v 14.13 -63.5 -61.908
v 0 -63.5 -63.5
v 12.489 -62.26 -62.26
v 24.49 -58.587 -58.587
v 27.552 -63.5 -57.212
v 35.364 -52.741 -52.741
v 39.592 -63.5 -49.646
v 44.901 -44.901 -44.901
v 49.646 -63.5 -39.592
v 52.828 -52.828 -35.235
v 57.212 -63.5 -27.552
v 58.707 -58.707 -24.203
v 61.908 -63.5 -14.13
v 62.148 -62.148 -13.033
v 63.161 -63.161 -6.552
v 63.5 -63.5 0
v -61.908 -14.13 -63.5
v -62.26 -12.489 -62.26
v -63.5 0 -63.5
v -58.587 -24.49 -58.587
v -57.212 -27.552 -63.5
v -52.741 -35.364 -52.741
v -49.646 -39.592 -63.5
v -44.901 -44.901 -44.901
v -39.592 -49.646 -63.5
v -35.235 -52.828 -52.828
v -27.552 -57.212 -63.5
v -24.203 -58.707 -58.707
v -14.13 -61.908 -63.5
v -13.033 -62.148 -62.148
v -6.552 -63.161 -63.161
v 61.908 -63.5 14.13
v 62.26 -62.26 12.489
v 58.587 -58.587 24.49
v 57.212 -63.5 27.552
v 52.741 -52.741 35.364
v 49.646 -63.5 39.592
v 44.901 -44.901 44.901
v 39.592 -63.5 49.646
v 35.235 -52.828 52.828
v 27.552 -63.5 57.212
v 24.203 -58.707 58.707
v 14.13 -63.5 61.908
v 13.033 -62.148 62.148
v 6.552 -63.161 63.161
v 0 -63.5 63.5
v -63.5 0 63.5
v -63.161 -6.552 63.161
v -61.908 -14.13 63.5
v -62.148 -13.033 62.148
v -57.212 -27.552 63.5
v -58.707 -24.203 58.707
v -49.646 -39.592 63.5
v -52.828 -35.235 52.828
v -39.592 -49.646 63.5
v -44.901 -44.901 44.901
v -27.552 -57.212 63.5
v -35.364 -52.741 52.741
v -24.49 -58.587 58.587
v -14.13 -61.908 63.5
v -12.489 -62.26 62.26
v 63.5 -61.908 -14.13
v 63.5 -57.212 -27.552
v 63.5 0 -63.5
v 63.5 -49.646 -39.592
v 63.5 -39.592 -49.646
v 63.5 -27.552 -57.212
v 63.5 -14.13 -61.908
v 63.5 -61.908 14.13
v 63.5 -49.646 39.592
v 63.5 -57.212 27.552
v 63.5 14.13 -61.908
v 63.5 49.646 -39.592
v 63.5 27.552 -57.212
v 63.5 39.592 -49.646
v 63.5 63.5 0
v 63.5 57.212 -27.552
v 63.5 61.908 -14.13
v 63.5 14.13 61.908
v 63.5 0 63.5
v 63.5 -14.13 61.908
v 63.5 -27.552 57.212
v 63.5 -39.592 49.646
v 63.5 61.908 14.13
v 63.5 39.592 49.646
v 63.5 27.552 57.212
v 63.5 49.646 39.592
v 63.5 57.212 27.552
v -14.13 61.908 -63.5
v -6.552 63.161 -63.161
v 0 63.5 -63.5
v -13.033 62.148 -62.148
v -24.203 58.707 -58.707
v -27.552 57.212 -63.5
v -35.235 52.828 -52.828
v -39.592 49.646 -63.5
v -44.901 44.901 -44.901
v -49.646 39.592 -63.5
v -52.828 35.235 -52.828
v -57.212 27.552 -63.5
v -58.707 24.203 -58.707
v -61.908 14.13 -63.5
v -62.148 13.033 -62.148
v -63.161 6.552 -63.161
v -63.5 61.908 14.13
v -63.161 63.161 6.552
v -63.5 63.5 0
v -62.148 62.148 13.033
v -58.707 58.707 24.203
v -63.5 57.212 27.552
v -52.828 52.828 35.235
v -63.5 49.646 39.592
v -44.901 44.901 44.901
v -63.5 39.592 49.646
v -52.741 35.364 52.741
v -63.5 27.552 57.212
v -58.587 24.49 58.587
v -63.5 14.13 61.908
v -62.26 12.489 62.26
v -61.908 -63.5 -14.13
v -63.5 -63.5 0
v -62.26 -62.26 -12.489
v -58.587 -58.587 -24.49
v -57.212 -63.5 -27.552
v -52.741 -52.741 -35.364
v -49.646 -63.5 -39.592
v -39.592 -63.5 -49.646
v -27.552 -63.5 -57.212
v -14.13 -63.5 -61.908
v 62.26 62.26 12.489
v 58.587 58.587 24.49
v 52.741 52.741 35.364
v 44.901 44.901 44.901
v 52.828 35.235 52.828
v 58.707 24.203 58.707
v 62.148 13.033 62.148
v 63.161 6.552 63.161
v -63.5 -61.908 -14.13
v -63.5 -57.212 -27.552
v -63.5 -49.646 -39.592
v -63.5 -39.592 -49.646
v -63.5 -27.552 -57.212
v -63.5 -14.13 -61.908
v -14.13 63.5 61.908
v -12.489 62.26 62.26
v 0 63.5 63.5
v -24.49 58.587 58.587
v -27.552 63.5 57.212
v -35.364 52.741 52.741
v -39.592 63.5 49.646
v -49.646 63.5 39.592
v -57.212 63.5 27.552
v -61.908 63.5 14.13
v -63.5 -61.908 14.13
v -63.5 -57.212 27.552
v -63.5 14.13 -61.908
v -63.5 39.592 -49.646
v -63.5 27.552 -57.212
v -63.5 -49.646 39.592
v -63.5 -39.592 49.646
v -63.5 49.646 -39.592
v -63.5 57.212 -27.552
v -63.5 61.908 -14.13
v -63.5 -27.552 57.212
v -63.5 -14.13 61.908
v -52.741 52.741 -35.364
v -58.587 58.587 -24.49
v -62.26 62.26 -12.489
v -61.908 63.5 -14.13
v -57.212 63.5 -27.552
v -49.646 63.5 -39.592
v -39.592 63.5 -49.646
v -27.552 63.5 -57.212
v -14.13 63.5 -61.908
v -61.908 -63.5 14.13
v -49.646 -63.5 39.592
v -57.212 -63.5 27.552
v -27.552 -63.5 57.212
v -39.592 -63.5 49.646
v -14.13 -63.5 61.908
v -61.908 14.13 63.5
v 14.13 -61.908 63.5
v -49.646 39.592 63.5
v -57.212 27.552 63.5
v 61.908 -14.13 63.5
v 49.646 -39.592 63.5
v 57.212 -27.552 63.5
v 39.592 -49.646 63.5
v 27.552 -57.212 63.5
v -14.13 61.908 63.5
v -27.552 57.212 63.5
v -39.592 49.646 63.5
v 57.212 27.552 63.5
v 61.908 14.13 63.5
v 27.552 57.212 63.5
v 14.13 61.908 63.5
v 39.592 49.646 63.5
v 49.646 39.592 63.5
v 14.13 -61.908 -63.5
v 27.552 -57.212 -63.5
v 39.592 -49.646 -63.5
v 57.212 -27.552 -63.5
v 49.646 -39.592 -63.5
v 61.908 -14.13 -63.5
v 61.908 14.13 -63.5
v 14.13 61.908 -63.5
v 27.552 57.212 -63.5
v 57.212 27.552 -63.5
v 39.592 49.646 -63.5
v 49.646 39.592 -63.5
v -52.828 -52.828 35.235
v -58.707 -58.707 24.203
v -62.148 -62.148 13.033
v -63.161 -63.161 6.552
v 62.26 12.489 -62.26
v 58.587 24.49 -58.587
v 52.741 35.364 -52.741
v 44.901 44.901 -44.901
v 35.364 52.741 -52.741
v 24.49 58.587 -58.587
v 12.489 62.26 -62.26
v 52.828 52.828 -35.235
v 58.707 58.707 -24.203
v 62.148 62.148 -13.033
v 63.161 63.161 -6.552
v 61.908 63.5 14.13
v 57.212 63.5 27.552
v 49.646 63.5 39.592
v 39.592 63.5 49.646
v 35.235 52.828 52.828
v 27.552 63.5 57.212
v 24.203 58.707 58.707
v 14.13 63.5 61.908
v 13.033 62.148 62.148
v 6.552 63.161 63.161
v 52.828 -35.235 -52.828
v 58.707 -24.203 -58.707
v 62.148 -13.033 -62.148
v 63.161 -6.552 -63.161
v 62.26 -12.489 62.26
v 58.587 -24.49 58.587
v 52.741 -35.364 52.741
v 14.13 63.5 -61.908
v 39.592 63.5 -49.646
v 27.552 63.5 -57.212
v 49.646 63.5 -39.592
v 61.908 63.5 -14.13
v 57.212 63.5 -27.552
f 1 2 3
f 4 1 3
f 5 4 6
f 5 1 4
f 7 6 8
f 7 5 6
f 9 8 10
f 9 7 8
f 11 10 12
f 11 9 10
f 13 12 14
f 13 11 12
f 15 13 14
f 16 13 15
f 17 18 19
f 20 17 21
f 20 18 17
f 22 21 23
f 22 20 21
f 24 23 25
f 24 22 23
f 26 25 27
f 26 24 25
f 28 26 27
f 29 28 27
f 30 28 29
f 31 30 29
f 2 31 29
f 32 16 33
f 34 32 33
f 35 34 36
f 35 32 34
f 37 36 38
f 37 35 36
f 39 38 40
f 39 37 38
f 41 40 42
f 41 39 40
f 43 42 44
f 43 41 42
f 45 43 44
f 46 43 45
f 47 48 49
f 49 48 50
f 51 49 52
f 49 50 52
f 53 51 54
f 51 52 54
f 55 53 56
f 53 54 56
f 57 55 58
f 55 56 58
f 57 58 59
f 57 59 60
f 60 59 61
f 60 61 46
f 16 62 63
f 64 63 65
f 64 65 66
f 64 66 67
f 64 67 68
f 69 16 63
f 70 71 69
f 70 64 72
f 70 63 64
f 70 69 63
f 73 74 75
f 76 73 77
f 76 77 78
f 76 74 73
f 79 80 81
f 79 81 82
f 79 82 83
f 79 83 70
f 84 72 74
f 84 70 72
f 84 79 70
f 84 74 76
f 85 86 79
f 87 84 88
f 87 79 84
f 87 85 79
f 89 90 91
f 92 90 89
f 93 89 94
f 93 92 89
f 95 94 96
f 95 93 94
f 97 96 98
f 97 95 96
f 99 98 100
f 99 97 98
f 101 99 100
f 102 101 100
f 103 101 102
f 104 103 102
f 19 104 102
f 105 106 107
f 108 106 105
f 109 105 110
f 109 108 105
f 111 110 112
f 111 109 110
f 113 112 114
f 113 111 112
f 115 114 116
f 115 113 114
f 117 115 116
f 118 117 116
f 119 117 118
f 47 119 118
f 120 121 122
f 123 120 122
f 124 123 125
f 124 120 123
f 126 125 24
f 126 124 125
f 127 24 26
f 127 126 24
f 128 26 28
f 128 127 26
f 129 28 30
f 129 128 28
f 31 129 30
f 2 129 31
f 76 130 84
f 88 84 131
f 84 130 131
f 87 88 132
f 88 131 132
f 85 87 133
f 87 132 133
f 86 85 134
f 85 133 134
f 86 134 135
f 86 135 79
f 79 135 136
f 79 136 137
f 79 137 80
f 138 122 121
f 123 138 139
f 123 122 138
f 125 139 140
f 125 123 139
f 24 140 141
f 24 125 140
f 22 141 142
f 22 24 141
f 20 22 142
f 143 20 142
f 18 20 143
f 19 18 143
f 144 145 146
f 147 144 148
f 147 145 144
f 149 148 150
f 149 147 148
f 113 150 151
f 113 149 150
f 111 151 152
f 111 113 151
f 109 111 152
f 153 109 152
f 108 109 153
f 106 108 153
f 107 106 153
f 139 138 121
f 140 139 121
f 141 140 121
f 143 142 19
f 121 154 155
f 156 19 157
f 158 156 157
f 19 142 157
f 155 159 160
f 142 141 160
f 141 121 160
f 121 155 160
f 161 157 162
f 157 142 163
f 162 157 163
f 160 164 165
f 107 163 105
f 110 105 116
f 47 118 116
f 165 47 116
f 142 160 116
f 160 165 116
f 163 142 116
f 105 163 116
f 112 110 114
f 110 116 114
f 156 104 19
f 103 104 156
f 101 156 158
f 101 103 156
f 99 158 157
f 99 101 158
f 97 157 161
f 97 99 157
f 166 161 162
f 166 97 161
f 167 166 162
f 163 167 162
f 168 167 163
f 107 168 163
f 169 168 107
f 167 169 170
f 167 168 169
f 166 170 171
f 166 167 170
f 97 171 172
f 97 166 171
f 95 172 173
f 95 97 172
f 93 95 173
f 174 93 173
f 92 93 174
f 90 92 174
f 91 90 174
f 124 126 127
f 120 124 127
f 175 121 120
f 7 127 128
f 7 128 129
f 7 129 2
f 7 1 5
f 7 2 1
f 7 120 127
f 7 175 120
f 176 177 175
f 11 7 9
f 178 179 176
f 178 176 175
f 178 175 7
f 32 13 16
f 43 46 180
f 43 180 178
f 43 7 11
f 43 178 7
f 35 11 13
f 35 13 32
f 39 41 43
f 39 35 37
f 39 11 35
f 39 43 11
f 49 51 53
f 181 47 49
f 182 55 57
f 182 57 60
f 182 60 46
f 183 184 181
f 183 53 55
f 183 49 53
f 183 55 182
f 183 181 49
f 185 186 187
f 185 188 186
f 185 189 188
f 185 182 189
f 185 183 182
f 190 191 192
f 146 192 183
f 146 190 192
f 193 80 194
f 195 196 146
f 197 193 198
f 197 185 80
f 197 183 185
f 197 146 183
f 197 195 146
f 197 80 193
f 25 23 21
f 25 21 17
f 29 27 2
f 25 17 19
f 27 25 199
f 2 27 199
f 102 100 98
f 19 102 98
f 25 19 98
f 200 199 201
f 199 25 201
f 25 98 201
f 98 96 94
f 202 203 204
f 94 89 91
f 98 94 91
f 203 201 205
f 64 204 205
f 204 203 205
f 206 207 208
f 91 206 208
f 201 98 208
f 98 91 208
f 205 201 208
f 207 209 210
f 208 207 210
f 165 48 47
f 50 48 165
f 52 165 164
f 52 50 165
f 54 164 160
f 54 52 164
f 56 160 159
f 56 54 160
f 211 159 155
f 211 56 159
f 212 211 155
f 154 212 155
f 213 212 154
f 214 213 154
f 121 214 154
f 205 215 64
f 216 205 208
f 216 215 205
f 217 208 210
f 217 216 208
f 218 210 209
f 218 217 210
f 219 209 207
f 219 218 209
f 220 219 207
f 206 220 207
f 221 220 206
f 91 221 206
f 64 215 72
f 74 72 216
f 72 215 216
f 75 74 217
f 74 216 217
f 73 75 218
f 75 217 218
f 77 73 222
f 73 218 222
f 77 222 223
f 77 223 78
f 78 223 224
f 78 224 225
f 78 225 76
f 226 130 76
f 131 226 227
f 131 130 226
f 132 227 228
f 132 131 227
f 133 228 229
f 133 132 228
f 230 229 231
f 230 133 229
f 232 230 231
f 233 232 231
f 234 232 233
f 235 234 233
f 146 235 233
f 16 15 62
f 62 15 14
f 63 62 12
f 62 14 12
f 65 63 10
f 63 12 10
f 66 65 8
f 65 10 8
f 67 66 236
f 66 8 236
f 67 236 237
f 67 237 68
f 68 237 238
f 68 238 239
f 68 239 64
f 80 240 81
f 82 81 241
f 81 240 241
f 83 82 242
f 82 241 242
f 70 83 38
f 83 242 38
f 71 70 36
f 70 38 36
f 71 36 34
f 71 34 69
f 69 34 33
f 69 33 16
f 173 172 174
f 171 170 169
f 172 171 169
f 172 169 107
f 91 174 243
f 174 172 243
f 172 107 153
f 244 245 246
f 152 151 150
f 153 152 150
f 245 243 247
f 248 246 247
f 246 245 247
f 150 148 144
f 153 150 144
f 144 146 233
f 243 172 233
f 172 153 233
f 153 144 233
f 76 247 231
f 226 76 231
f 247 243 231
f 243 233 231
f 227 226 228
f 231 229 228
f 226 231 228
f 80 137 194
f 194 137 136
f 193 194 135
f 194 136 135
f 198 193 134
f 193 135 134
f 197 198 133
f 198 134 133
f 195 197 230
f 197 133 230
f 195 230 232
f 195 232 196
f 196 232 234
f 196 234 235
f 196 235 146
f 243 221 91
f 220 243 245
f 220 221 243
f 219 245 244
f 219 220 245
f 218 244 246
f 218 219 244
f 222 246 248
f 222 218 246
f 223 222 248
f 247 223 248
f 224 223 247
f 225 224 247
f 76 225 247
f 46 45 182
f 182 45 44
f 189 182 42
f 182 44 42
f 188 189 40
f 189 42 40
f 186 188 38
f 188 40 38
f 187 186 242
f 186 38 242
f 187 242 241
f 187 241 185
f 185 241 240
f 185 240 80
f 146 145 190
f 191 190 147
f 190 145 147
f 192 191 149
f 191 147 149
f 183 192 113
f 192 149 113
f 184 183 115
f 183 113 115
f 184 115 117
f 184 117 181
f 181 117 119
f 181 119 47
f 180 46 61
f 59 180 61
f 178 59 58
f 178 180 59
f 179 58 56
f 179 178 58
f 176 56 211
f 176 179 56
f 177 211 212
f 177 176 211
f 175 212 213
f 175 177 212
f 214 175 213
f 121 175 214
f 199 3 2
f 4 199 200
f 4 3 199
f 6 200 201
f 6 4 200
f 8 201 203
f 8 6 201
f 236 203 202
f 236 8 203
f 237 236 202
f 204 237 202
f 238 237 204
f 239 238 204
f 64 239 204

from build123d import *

# Parameters (mm, degrees)
F0_R          = 63.5
F1_DEPTH      = 63.5
F1_DEPTH_BACK = 63.5
F2_R          = 63.5
F3_DEPTH      = 63.5
F3_DEPTH_BACK = 63.5
F4_R          = 63.5
F5_DEPTH      = 63.5
F5_DEPTH_BACK = 63.5


with BuildPart() as f1:
    # F0 (on Front) → F1 (new body, two sides)
    with BuildSketch(Plane.XZ) as f1_sk:
        Circle(F0_R)
    extrude(amount=F1_DEPTH)
    extrude(f1_sk.sketch, amount=-F1_DEPTH_BACK)

    # F2 (on Top) → F3 (join, two sides)
    with BuildSketch(Plane.XY) as f3_sk:
        Circle(F2_R)
    extrude(amount=F3_DEPTH)
    extrude(f3_sk.sketch, amount=-F3_DEPTH_BACK)

    # F4 (on Right) → F5 (join, two sides)
    with BuildSketch(Plane.YZ) as f5_sk:
        Circle(F4_R)
    extrude(amount=F5_DEPTH)
    extrude(f5_sk.sketch, amount=-F5_DEPTH_BACK)


solid = f1.part
